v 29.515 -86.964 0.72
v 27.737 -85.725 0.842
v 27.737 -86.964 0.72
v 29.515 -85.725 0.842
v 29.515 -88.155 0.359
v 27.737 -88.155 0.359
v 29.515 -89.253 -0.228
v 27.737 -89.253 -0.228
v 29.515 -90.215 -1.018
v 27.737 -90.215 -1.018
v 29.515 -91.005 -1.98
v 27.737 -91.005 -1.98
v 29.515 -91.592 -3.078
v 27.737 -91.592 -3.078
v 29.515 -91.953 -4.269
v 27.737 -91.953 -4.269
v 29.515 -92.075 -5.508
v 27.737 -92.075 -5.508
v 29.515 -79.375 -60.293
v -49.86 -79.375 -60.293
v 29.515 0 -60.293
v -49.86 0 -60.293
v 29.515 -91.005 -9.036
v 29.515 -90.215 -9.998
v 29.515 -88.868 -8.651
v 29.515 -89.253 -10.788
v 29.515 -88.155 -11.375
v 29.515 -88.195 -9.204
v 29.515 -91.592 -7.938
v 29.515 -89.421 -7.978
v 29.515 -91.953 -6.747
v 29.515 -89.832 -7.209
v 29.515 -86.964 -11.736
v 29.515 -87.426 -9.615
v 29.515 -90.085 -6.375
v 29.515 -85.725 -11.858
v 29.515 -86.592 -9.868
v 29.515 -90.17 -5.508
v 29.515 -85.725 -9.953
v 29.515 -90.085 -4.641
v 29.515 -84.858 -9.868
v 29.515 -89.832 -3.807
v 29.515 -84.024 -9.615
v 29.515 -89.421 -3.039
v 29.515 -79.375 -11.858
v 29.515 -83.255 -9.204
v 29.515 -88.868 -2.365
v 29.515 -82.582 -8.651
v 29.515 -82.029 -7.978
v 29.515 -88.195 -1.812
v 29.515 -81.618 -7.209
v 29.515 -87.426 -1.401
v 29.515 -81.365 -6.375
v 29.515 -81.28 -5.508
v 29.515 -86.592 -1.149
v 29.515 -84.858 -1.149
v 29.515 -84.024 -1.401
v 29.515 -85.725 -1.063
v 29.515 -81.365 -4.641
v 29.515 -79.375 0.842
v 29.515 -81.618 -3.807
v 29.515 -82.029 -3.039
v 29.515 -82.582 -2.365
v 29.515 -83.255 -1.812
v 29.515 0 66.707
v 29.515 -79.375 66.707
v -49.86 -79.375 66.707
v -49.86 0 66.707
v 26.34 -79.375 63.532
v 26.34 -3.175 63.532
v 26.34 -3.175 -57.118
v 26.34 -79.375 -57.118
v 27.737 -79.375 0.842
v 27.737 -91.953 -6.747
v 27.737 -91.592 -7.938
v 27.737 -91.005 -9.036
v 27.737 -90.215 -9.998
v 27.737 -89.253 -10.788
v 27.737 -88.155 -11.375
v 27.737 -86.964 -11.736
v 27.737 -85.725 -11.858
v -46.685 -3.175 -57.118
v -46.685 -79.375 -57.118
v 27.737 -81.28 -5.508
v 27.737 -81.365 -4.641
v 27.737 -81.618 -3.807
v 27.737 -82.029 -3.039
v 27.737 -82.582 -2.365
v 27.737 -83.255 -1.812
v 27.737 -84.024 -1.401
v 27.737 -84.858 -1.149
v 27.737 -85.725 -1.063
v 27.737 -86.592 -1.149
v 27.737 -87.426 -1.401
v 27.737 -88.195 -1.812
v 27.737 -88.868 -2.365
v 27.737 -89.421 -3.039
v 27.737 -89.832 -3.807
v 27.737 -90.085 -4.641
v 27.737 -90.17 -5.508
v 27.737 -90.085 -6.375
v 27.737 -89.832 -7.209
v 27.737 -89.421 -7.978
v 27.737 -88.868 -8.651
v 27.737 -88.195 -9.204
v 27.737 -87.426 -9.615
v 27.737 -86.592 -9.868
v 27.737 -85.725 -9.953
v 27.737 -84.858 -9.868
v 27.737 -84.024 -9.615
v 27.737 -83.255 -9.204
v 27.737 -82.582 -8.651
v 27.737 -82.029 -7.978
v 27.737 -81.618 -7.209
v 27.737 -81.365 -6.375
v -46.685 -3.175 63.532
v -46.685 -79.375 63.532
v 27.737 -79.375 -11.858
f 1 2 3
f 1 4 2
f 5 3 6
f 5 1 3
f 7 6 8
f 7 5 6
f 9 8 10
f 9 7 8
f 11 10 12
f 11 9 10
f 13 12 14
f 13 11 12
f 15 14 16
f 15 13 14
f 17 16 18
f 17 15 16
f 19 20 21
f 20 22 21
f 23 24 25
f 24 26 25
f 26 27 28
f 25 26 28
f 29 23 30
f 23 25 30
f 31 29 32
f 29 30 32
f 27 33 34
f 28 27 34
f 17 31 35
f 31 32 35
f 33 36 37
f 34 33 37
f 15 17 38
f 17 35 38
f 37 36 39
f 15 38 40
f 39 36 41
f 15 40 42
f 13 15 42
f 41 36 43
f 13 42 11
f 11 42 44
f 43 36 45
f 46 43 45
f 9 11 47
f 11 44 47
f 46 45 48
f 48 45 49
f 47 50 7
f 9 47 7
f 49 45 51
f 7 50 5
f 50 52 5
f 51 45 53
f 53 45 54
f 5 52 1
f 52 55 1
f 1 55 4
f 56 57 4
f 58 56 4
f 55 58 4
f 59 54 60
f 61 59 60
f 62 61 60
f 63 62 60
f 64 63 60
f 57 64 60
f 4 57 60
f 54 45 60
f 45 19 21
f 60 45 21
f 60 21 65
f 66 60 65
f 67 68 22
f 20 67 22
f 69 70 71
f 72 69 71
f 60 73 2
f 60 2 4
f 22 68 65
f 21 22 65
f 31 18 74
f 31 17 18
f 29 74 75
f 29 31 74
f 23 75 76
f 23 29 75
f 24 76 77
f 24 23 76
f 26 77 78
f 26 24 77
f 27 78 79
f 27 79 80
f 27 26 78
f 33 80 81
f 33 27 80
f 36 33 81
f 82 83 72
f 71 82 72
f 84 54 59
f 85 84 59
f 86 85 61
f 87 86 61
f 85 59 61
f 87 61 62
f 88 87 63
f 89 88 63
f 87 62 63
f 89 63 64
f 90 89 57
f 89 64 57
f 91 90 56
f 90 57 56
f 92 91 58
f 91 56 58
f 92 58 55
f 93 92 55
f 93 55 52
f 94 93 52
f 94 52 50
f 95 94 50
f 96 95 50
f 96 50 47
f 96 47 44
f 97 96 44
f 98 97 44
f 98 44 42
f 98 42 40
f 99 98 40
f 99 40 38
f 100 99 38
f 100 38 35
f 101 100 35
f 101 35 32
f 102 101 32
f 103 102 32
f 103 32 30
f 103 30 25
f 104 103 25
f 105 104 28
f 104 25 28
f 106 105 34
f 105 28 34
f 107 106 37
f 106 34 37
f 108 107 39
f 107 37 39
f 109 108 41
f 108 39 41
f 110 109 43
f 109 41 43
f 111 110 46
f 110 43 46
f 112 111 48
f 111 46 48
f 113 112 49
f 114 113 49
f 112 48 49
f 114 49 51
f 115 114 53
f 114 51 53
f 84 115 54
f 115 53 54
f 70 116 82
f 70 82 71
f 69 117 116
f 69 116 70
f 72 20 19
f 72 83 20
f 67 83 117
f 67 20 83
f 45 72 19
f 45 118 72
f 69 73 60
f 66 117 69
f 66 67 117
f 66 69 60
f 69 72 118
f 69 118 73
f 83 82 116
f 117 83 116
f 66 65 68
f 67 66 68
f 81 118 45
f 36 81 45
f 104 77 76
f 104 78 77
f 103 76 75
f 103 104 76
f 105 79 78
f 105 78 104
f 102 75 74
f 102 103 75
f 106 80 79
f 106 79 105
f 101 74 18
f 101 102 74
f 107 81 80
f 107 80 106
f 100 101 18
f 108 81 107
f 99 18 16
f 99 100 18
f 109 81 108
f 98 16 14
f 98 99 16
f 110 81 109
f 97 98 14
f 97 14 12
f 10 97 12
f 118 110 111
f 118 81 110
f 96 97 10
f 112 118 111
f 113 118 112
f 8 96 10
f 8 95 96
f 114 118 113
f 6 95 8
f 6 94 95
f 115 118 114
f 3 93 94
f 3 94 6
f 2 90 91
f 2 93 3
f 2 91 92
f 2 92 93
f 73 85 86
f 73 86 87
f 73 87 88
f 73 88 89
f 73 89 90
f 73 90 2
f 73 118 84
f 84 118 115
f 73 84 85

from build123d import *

# Parameters (mm, degrees)
F0_W     = 79.375
F0_H     = 127
F1_DEPTH = 3.175
F2_W     = 73.025
F2_H     = 3.175
F3_DEPTH = 76.2
F4_W     = 1.778
F4_H     = 12.7
F5_DEPTH = 12.7
F6_R     = 6.35
F7_R     = 6.34999
F8_R     = 4.445
F9_DEPTH = 25.4


# Not quite as in the source:
# - a fillet or chamfer is up to 0.001 mm smaller than in the source, because OpenCascade refuses the exact size


with BuildPart() as f1:
    # F0 (on Front) → F1 (new body)
    with BuildSketch(Plane.XZ):
        with Locations((-10.1727880716, 3.2072235078)):
            Rectangle(F0_W, F0_H)
    extrude(amount=F1_DEPTH)

    # F2 (on face) → F3 (join)
    with BuildSketch(Plane.XZ.offset(3.175)):
        Polygon((-46.6852880716, 63.5322235078), (-46.6852880716, 66.7072235078), (-49.8602880716, 66.7072235078), (-49.8602880716, -60.2927764922), (-46.6852880716, -60.2927764922), (-46.6852880716, -57.1177764922), align=None)
        with Locations((-10.1727880716, 65.1197235078)):
            Rectangle(F2_W, F2_H)
        Polygon((29.5147119284, 66.7072235078), (26.3397119284, 66.7072235078), (26.3397119284, 63.5322235078), (26.3397119284, -57.1177764922), (26.3397119284, -60.2927764922), (29.5147119284, -60.2927764922), align=None)
        with Locations((-10.1727880716, -58.7052764922)):
            Rectangle(F2_W, F2_H)
    extrude(amount=F3_DEPTH)

    # F4 (on face) → F5 (join)
    with BuildSketch(Plane.XZ.offset(79.375)):
        with Locations((28.6257119284, -5.5081006922)):
            Rectangle(F4_W, F4_H)
    extrude(amount=F5_DEPTH)

    # F6
    f6_edges = [f1.edges().sort_by_distance(p)[0] for p in [
        (28.625712, -92.075, 0.841899),
    ]]
    fillet(f6_edges, radius=F6_R)

    # F7 (radius 6.35 in the source; OpenCascade refuses exactly that, so slightly less here)
    f7_edges = [f1.edges().sort_by_distance(p)[0] for p in [
        (28.625712, -92.075, -11.858101),
    ]]
    fillet(f7_edges, radius=F7_R)

    # F8 (on face) → F9 (cut)
    with BuildSketch(Plane.YZ.offset(29.5147119284)):
        with Locations((-85.725, -5.5081006922)):
            Circle(F8_R)
    extrude(amount=-F9_DEPTH, mode=Mode.SUBTRACT)


solid = f1.part
